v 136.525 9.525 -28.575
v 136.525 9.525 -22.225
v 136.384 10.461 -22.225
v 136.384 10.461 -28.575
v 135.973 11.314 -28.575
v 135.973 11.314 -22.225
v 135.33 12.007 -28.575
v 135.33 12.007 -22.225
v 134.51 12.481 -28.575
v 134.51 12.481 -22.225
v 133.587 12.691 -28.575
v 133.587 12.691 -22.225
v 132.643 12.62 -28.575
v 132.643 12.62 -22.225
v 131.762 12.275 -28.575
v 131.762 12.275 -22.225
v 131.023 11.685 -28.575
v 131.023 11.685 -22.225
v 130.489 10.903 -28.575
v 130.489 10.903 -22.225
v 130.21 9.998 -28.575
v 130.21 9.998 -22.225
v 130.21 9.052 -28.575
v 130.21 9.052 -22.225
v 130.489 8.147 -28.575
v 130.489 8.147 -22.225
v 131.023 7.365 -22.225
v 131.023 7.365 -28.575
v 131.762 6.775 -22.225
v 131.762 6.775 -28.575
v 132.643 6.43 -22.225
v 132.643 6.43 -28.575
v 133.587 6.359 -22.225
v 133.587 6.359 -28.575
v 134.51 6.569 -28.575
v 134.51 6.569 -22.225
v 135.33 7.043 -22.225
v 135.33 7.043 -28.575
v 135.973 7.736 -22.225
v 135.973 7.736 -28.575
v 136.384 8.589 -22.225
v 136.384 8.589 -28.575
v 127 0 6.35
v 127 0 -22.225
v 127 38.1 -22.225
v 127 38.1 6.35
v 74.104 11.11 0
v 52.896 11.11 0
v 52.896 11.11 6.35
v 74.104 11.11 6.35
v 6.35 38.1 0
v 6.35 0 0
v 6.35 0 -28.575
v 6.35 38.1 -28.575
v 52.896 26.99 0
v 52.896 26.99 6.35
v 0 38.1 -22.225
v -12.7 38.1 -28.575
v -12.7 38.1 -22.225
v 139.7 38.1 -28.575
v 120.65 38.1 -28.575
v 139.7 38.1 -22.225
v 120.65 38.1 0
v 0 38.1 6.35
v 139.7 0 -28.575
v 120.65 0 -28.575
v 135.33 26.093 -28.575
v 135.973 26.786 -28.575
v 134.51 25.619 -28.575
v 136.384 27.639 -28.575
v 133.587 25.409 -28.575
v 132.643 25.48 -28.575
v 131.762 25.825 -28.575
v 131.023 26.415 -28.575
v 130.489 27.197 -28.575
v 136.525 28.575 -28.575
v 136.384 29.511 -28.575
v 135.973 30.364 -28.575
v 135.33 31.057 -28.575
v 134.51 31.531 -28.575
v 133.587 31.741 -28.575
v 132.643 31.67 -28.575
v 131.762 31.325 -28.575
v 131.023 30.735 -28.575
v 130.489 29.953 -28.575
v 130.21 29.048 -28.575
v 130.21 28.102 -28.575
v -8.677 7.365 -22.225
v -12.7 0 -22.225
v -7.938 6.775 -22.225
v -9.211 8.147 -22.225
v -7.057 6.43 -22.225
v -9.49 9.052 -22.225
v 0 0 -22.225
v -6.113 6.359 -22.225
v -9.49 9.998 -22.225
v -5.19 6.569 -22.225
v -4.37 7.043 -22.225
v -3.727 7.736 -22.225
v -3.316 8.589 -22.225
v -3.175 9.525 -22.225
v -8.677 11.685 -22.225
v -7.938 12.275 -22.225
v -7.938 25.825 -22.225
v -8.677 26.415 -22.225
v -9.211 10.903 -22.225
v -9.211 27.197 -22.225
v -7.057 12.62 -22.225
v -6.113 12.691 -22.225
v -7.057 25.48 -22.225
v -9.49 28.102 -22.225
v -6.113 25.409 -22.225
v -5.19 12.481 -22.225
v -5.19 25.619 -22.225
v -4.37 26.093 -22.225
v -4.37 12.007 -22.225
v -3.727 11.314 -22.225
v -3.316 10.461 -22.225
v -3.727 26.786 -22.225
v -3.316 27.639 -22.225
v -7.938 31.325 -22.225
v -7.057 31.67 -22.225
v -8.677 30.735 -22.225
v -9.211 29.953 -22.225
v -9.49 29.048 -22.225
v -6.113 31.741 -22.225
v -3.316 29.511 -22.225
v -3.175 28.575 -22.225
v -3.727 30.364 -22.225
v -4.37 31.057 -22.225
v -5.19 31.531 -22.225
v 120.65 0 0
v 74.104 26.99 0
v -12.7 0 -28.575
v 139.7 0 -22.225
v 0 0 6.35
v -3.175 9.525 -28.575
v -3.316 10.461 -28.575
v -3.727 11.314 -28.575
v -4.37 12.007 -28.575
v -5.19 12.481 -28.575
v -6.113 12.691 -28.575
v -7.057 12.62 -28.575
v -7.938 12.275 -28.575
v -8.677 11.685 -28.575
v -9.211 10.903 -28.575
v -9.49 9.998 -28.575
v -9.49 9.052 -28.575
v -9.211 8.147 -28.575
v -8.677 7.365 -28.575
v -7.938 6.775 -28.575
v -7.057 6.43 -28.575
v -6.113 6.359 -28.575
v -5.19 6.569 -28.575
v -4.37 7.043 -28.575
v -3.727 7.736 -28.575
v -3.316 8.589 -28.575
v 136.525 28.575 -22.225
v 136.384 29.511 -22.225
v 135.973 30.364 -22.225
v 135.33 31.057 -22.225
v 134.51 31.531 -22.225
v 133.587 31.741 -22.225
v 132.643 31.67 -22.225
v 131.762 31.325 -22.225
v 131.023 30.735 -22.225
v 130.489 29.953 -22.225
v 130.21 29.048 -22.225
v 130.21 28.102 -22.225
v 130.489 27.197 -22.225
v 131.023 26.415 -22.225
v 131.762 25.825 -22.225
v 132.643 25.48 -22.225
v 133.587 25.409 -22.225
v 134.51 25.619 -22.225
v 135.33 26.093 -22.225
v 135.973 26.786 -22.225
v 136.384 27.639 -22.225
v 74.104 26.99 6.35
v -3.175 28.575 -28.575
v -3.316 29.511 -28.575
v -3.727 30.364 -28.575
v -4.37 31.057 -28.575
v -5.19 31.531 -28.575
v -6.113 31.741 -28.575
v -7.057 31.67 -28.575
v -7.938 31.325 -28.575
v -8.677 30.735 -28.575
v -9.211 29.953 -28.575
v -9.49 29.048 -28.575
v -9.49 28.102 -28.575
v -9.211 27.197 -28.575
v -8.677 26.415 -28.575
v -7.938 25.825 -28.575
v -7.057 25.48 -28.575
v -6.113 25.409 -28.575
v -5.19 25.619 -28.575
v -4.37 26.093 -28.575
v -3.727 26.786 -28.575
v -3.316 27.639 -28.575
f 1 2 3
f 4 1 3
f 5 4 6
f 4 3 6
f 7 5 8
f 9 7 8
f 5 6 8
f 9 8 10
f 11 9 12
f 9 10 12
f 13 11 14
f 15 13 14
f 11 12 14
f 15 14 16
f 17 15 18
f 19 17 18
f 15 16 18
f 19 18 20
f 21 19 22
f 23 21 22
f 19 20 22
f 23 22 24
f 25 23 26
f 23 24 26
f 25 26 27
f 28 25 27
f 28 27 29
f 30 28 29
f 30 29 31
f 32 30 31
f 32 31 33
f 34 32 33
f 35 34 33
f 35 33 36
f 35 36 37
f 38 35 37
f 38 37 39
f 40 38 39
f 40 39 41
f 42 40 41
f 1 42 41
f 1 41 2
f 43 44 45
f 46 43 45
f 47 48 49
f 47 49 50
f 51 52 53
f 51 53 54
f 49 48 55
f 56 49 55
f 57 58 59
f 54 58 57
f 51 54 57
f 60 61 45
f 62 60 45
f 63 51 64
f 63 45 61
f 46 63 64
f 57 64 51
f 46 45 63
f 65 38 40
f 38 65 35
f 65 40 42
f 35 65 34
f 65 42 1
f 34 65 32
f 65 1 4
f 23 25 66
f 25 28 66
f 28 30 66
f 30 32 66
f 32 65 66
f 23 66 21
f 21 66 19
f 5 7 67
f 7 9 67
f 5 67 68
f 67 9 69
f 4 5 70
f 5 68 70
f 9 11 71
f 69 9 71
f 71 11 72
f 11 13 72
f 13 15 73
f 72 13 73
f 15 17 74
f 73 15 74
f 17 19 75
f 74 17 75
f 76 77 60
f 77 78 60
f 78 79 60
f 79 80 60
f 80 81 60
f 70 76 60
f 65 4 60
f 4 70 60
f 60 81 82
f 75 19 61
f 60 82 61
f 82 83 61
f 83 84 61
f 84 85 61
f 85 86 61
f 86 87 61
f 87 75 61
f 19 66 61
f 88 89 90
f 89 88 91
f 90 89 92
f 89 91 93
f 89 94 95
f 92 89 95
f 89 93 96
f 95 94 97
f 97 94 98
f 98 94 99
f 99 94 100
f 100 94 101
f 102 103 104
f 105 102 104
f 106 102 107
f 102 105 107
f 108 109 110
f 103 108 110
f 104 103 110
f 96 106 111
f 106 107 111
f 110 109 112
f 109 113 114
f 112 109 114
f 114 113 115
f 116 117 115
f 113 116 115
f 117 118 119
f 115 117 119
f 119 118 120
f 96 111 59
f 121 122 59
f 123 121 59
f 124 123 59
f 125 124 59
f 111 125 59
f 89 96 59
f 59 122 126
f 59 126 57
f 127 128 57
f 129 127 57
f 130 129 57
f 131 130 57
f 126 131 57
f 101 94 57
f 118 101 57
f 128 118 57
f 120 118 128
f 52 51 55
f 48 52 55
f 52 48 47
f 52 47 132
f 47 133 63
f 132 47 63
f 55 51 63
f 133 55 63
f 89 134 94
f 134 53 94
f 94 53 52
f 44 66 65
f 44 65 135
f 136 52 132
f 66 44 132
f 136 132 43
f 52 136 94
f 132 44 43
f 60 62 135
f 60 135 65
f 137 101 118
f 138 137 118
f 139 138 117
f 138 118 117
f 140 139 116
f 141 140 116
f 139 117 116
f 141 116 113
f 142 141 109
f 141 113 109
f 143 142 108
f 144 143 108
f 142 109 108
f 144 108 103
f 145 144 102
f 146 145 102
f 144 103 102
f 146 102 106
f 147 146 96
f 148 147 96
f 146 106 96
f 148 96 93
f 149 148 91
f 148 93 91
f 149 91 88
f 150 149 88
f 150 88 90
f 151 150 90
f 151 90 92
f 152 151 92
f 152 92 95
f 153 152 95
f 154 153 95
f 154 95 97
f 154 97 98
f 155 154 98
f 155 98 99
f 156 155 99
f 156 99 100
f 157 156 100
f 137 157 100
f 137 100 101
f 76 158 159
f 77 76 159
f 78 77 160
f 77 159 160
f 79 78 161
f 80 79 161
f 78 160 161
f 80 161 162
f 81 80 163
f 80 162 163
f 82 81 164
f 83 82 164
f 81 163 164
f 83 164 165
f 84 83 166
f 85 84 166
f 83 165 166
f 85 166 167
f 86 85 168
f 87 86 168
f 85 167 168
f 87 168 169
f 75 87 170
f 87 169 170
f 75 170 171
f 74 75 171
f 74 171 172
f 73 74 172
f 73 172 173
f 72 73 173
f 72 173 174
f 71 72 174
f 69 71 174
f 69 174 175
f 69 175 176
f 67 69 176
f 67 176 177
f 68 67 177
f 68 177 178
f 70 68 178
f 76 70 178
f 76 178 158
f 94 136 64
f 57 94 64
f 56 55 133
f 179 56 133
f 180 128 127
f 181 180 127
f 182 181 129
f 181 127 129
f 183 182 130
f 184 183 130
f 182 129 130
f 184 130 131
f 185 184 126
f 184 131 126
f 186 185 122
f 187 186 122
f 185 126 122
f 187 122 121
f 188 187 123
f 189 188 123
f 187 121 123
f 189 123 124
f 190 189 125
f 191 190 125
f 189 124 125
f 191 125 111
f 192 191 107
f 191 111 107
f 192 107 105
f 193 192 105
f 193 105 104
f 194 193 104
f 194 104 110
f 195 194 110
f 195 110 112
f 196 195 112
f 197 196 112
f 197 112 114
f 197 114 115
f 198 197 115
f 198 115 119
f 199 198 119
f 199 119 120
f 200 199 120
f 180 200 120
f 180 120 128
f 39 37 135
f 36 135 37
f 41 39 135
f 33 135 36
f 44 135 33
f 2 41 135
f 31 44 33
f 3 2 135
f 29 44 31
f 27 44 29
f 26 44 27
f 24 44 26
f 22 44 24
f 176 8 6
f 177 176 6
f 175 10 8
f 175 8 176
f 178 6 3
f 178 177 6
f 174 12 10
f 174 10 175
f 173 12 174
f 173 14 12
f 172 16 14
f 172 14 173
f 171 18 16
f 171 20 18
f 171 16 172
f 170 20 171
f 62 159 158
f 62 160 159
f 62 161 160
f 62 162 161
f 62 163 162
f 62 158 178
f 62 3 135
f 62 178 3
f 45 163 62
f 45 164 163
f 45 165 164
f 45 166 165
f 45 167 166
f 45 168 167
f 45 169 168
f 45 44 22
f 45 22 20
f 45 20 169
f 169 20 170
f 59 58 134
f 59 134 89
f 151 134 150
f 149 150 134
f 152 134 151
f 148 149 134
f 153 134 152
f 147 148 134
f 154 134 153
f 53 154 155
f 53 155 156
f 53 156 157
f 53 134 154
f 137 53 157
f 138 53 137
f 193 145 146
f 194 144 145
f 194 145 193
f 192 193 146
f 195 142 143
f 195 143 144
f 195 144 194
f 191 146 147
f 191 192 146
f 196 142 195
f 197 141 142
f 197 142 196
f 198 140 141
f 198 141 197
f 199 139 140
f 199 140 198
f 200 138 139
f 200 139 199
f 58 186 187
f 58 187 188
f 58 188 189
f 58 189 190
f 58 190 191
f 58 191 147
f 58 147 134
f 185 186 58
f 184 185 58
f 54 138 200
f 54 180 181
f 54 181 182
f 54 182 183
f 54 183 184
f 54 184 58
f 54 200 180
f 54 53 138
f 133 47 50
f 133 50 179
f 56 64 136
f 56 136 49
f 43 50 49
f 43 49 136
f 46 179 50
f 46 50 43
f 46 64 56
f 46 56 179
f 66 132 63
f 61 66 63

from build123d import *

# Parameters (mm, degrees)
SKETCH1_W           = 127
SKETCH1_H           = 38.1
SKETCH1_W_2         = 21.209
SKETCH1_H_2         = 15.88008
BOSS_EXTRUDE1_DEPTH = 6.35
SKETCH2_W           = 6.35
SKETCH2_H           = 38.1
BOSS_EXTRUDE2_DEPTH = 28.575
SKETCH3_W           = 6.35
SKETCH3_H           = 38.1
BOSS_EXTRUDE3_DEPTH = 12.7
SKETCH4_W           = 6.35
SKETCH4_H           = 38.1
BOSS_EXTRUDE4_DEPTH = 12.7
CUT_EXTRUDE1_REACH  = 149.595
SKETCH5_R           = 3.175


with BuildPart() as part:
    # Sketch1 → Boss-Extrude1 (new body)
    with BuildSketch(Plane.XY):
        with Locations((63.5, 19.05)):
            Rectangle(SKETCH1_W, SKETCH1_H)
        with Locations((63.5, 19.05)):
            Rectangle(SKETCH1_W_2, SKETCH1_H_2, mode=Mode.SUBTRACT)
    extrude(amount=BOSS_EXTRUDE1_DEPTH)

    # Sketch2 → Boss-Extrude2 (add)
    with BuildSketch(Plane(origin=(0, 0, 0), x_dir=(-1, 0, 0), z_dir=(0, 0, -1))):
        with Locations((-3.175, 19.05)):
            Rectangle(SKETCH2_W, SKETCH2_H)
        with Locations((-123.825, 19.05)):
            Rectangle(SKETCH2_W, SKETCH2_H)
    extrude(amount=BOSS_EXTRUDE2_DEPTH)

    # Sketch3 → Boss-Extrude3 (add)
    with BuildSketch(Plane(origin=(127, 0, 0), x_dir=(0, 0, -1), z_dir=(1, 0, 0))):
        with Locations((25.4, 19.05)):
            Rectangle(SKETCH3_W, SKETCH3_H)
    extrude(amount=BOSS_EXTRUDE3_DEPTH)

    # Sketch4 → Boss-Extrude4 (add)
    with BuildSketch(Plane.ZY):
        with Locations((-25.4, 19.05)):
            Rectangle(SKETCH4_W, SKETCH4_H)
    extrude(amount=BOSS_EXTRUDE4_DEPTH)

    # Sketch5 → Cut-Extrude1 (cut, up to next)
    with BuildSketch(Plane.XY.offset(-22.225), mode=Mode.PRIVATE) as cut_extrude1_sk1:
        with Locations((133.35, 28.575)):
            Circle(SKETCH5_R)
    cut_extrude1_tool1 = extrude(cut_extrude1_sk1.sketch, amount=-CUT_EXTRUDE1_REACH, mode=Mode.PRIVATE) & part.part
    # Sketch5 → Cut-Extrude1 (cut, up to next)
    with BuildSketch(Plane.XY.offset(-22.225), mode=Mode.PRIVATE) as cut_extrude1_sk2:
        with Locations((133.35, 9.525)):
            Circle(SKETCH5_R)
    cut_extrude1_tool2 = extrude(cut_extrude1_sk2.sketch, amount=-CUT_EXTRUDE1_REACH, mode=Mode.PRIVATE) & part.part
    # Sketch5 → Cut-Extrude1 (cut, up to next)
    with BuildSketch(Plane.XY.offset(-22.225), mode=Mode.PRIVATE) as cut_extrude1_sk3:
        with Locations((-6.35, 28.575)):
            Circle(SKETCH5_R)
    cut_extrude1_tool3 = extrude(cut_extrude1_sk3.sketch, amount=-CUT_EXTRUDE1_REACH, mode=Mode.PRIVATE) & part.part
    # Sketch5 → Cut-Extrude1 (cut, up to next)
    with BuildSketch(Plane.XY.offset(-22.225), mode=Mode.PRIVATE) as cut_extrude1_sk4:
        with Locations((-6.35, 9.525)):
            Circle(SKETCH5_R)
    cut_extrude1_tool4 = extrude(cut_extrude1_sk4.sketch, amount=-CUT_EXTRUDE1_REACH, mode=Mode.PRIVATE) & part.part
    add(cut_extrude1_tool1.solids().sort_by_distance((133.35, 28.575, -22.225))[0], mode=Mode.SUBTRACT)
    add(cut_extrude1_tool2.solids().sort_by_distance((133.35, 9.525, -22.225))[0], mode=Mode.SUBTRACT)
    add(cut_extrude1_tool3.solids().sort_by_distance((-6.35, 28.575, -22.225))[0], mode=Mode.SUBTRACT)
    add(cut_extrude1_tool4.solids().sort_by_distance((-6.35, 9.525, -22.225))[0], mode=Mode.SUBTRACT)


solid = part.part
